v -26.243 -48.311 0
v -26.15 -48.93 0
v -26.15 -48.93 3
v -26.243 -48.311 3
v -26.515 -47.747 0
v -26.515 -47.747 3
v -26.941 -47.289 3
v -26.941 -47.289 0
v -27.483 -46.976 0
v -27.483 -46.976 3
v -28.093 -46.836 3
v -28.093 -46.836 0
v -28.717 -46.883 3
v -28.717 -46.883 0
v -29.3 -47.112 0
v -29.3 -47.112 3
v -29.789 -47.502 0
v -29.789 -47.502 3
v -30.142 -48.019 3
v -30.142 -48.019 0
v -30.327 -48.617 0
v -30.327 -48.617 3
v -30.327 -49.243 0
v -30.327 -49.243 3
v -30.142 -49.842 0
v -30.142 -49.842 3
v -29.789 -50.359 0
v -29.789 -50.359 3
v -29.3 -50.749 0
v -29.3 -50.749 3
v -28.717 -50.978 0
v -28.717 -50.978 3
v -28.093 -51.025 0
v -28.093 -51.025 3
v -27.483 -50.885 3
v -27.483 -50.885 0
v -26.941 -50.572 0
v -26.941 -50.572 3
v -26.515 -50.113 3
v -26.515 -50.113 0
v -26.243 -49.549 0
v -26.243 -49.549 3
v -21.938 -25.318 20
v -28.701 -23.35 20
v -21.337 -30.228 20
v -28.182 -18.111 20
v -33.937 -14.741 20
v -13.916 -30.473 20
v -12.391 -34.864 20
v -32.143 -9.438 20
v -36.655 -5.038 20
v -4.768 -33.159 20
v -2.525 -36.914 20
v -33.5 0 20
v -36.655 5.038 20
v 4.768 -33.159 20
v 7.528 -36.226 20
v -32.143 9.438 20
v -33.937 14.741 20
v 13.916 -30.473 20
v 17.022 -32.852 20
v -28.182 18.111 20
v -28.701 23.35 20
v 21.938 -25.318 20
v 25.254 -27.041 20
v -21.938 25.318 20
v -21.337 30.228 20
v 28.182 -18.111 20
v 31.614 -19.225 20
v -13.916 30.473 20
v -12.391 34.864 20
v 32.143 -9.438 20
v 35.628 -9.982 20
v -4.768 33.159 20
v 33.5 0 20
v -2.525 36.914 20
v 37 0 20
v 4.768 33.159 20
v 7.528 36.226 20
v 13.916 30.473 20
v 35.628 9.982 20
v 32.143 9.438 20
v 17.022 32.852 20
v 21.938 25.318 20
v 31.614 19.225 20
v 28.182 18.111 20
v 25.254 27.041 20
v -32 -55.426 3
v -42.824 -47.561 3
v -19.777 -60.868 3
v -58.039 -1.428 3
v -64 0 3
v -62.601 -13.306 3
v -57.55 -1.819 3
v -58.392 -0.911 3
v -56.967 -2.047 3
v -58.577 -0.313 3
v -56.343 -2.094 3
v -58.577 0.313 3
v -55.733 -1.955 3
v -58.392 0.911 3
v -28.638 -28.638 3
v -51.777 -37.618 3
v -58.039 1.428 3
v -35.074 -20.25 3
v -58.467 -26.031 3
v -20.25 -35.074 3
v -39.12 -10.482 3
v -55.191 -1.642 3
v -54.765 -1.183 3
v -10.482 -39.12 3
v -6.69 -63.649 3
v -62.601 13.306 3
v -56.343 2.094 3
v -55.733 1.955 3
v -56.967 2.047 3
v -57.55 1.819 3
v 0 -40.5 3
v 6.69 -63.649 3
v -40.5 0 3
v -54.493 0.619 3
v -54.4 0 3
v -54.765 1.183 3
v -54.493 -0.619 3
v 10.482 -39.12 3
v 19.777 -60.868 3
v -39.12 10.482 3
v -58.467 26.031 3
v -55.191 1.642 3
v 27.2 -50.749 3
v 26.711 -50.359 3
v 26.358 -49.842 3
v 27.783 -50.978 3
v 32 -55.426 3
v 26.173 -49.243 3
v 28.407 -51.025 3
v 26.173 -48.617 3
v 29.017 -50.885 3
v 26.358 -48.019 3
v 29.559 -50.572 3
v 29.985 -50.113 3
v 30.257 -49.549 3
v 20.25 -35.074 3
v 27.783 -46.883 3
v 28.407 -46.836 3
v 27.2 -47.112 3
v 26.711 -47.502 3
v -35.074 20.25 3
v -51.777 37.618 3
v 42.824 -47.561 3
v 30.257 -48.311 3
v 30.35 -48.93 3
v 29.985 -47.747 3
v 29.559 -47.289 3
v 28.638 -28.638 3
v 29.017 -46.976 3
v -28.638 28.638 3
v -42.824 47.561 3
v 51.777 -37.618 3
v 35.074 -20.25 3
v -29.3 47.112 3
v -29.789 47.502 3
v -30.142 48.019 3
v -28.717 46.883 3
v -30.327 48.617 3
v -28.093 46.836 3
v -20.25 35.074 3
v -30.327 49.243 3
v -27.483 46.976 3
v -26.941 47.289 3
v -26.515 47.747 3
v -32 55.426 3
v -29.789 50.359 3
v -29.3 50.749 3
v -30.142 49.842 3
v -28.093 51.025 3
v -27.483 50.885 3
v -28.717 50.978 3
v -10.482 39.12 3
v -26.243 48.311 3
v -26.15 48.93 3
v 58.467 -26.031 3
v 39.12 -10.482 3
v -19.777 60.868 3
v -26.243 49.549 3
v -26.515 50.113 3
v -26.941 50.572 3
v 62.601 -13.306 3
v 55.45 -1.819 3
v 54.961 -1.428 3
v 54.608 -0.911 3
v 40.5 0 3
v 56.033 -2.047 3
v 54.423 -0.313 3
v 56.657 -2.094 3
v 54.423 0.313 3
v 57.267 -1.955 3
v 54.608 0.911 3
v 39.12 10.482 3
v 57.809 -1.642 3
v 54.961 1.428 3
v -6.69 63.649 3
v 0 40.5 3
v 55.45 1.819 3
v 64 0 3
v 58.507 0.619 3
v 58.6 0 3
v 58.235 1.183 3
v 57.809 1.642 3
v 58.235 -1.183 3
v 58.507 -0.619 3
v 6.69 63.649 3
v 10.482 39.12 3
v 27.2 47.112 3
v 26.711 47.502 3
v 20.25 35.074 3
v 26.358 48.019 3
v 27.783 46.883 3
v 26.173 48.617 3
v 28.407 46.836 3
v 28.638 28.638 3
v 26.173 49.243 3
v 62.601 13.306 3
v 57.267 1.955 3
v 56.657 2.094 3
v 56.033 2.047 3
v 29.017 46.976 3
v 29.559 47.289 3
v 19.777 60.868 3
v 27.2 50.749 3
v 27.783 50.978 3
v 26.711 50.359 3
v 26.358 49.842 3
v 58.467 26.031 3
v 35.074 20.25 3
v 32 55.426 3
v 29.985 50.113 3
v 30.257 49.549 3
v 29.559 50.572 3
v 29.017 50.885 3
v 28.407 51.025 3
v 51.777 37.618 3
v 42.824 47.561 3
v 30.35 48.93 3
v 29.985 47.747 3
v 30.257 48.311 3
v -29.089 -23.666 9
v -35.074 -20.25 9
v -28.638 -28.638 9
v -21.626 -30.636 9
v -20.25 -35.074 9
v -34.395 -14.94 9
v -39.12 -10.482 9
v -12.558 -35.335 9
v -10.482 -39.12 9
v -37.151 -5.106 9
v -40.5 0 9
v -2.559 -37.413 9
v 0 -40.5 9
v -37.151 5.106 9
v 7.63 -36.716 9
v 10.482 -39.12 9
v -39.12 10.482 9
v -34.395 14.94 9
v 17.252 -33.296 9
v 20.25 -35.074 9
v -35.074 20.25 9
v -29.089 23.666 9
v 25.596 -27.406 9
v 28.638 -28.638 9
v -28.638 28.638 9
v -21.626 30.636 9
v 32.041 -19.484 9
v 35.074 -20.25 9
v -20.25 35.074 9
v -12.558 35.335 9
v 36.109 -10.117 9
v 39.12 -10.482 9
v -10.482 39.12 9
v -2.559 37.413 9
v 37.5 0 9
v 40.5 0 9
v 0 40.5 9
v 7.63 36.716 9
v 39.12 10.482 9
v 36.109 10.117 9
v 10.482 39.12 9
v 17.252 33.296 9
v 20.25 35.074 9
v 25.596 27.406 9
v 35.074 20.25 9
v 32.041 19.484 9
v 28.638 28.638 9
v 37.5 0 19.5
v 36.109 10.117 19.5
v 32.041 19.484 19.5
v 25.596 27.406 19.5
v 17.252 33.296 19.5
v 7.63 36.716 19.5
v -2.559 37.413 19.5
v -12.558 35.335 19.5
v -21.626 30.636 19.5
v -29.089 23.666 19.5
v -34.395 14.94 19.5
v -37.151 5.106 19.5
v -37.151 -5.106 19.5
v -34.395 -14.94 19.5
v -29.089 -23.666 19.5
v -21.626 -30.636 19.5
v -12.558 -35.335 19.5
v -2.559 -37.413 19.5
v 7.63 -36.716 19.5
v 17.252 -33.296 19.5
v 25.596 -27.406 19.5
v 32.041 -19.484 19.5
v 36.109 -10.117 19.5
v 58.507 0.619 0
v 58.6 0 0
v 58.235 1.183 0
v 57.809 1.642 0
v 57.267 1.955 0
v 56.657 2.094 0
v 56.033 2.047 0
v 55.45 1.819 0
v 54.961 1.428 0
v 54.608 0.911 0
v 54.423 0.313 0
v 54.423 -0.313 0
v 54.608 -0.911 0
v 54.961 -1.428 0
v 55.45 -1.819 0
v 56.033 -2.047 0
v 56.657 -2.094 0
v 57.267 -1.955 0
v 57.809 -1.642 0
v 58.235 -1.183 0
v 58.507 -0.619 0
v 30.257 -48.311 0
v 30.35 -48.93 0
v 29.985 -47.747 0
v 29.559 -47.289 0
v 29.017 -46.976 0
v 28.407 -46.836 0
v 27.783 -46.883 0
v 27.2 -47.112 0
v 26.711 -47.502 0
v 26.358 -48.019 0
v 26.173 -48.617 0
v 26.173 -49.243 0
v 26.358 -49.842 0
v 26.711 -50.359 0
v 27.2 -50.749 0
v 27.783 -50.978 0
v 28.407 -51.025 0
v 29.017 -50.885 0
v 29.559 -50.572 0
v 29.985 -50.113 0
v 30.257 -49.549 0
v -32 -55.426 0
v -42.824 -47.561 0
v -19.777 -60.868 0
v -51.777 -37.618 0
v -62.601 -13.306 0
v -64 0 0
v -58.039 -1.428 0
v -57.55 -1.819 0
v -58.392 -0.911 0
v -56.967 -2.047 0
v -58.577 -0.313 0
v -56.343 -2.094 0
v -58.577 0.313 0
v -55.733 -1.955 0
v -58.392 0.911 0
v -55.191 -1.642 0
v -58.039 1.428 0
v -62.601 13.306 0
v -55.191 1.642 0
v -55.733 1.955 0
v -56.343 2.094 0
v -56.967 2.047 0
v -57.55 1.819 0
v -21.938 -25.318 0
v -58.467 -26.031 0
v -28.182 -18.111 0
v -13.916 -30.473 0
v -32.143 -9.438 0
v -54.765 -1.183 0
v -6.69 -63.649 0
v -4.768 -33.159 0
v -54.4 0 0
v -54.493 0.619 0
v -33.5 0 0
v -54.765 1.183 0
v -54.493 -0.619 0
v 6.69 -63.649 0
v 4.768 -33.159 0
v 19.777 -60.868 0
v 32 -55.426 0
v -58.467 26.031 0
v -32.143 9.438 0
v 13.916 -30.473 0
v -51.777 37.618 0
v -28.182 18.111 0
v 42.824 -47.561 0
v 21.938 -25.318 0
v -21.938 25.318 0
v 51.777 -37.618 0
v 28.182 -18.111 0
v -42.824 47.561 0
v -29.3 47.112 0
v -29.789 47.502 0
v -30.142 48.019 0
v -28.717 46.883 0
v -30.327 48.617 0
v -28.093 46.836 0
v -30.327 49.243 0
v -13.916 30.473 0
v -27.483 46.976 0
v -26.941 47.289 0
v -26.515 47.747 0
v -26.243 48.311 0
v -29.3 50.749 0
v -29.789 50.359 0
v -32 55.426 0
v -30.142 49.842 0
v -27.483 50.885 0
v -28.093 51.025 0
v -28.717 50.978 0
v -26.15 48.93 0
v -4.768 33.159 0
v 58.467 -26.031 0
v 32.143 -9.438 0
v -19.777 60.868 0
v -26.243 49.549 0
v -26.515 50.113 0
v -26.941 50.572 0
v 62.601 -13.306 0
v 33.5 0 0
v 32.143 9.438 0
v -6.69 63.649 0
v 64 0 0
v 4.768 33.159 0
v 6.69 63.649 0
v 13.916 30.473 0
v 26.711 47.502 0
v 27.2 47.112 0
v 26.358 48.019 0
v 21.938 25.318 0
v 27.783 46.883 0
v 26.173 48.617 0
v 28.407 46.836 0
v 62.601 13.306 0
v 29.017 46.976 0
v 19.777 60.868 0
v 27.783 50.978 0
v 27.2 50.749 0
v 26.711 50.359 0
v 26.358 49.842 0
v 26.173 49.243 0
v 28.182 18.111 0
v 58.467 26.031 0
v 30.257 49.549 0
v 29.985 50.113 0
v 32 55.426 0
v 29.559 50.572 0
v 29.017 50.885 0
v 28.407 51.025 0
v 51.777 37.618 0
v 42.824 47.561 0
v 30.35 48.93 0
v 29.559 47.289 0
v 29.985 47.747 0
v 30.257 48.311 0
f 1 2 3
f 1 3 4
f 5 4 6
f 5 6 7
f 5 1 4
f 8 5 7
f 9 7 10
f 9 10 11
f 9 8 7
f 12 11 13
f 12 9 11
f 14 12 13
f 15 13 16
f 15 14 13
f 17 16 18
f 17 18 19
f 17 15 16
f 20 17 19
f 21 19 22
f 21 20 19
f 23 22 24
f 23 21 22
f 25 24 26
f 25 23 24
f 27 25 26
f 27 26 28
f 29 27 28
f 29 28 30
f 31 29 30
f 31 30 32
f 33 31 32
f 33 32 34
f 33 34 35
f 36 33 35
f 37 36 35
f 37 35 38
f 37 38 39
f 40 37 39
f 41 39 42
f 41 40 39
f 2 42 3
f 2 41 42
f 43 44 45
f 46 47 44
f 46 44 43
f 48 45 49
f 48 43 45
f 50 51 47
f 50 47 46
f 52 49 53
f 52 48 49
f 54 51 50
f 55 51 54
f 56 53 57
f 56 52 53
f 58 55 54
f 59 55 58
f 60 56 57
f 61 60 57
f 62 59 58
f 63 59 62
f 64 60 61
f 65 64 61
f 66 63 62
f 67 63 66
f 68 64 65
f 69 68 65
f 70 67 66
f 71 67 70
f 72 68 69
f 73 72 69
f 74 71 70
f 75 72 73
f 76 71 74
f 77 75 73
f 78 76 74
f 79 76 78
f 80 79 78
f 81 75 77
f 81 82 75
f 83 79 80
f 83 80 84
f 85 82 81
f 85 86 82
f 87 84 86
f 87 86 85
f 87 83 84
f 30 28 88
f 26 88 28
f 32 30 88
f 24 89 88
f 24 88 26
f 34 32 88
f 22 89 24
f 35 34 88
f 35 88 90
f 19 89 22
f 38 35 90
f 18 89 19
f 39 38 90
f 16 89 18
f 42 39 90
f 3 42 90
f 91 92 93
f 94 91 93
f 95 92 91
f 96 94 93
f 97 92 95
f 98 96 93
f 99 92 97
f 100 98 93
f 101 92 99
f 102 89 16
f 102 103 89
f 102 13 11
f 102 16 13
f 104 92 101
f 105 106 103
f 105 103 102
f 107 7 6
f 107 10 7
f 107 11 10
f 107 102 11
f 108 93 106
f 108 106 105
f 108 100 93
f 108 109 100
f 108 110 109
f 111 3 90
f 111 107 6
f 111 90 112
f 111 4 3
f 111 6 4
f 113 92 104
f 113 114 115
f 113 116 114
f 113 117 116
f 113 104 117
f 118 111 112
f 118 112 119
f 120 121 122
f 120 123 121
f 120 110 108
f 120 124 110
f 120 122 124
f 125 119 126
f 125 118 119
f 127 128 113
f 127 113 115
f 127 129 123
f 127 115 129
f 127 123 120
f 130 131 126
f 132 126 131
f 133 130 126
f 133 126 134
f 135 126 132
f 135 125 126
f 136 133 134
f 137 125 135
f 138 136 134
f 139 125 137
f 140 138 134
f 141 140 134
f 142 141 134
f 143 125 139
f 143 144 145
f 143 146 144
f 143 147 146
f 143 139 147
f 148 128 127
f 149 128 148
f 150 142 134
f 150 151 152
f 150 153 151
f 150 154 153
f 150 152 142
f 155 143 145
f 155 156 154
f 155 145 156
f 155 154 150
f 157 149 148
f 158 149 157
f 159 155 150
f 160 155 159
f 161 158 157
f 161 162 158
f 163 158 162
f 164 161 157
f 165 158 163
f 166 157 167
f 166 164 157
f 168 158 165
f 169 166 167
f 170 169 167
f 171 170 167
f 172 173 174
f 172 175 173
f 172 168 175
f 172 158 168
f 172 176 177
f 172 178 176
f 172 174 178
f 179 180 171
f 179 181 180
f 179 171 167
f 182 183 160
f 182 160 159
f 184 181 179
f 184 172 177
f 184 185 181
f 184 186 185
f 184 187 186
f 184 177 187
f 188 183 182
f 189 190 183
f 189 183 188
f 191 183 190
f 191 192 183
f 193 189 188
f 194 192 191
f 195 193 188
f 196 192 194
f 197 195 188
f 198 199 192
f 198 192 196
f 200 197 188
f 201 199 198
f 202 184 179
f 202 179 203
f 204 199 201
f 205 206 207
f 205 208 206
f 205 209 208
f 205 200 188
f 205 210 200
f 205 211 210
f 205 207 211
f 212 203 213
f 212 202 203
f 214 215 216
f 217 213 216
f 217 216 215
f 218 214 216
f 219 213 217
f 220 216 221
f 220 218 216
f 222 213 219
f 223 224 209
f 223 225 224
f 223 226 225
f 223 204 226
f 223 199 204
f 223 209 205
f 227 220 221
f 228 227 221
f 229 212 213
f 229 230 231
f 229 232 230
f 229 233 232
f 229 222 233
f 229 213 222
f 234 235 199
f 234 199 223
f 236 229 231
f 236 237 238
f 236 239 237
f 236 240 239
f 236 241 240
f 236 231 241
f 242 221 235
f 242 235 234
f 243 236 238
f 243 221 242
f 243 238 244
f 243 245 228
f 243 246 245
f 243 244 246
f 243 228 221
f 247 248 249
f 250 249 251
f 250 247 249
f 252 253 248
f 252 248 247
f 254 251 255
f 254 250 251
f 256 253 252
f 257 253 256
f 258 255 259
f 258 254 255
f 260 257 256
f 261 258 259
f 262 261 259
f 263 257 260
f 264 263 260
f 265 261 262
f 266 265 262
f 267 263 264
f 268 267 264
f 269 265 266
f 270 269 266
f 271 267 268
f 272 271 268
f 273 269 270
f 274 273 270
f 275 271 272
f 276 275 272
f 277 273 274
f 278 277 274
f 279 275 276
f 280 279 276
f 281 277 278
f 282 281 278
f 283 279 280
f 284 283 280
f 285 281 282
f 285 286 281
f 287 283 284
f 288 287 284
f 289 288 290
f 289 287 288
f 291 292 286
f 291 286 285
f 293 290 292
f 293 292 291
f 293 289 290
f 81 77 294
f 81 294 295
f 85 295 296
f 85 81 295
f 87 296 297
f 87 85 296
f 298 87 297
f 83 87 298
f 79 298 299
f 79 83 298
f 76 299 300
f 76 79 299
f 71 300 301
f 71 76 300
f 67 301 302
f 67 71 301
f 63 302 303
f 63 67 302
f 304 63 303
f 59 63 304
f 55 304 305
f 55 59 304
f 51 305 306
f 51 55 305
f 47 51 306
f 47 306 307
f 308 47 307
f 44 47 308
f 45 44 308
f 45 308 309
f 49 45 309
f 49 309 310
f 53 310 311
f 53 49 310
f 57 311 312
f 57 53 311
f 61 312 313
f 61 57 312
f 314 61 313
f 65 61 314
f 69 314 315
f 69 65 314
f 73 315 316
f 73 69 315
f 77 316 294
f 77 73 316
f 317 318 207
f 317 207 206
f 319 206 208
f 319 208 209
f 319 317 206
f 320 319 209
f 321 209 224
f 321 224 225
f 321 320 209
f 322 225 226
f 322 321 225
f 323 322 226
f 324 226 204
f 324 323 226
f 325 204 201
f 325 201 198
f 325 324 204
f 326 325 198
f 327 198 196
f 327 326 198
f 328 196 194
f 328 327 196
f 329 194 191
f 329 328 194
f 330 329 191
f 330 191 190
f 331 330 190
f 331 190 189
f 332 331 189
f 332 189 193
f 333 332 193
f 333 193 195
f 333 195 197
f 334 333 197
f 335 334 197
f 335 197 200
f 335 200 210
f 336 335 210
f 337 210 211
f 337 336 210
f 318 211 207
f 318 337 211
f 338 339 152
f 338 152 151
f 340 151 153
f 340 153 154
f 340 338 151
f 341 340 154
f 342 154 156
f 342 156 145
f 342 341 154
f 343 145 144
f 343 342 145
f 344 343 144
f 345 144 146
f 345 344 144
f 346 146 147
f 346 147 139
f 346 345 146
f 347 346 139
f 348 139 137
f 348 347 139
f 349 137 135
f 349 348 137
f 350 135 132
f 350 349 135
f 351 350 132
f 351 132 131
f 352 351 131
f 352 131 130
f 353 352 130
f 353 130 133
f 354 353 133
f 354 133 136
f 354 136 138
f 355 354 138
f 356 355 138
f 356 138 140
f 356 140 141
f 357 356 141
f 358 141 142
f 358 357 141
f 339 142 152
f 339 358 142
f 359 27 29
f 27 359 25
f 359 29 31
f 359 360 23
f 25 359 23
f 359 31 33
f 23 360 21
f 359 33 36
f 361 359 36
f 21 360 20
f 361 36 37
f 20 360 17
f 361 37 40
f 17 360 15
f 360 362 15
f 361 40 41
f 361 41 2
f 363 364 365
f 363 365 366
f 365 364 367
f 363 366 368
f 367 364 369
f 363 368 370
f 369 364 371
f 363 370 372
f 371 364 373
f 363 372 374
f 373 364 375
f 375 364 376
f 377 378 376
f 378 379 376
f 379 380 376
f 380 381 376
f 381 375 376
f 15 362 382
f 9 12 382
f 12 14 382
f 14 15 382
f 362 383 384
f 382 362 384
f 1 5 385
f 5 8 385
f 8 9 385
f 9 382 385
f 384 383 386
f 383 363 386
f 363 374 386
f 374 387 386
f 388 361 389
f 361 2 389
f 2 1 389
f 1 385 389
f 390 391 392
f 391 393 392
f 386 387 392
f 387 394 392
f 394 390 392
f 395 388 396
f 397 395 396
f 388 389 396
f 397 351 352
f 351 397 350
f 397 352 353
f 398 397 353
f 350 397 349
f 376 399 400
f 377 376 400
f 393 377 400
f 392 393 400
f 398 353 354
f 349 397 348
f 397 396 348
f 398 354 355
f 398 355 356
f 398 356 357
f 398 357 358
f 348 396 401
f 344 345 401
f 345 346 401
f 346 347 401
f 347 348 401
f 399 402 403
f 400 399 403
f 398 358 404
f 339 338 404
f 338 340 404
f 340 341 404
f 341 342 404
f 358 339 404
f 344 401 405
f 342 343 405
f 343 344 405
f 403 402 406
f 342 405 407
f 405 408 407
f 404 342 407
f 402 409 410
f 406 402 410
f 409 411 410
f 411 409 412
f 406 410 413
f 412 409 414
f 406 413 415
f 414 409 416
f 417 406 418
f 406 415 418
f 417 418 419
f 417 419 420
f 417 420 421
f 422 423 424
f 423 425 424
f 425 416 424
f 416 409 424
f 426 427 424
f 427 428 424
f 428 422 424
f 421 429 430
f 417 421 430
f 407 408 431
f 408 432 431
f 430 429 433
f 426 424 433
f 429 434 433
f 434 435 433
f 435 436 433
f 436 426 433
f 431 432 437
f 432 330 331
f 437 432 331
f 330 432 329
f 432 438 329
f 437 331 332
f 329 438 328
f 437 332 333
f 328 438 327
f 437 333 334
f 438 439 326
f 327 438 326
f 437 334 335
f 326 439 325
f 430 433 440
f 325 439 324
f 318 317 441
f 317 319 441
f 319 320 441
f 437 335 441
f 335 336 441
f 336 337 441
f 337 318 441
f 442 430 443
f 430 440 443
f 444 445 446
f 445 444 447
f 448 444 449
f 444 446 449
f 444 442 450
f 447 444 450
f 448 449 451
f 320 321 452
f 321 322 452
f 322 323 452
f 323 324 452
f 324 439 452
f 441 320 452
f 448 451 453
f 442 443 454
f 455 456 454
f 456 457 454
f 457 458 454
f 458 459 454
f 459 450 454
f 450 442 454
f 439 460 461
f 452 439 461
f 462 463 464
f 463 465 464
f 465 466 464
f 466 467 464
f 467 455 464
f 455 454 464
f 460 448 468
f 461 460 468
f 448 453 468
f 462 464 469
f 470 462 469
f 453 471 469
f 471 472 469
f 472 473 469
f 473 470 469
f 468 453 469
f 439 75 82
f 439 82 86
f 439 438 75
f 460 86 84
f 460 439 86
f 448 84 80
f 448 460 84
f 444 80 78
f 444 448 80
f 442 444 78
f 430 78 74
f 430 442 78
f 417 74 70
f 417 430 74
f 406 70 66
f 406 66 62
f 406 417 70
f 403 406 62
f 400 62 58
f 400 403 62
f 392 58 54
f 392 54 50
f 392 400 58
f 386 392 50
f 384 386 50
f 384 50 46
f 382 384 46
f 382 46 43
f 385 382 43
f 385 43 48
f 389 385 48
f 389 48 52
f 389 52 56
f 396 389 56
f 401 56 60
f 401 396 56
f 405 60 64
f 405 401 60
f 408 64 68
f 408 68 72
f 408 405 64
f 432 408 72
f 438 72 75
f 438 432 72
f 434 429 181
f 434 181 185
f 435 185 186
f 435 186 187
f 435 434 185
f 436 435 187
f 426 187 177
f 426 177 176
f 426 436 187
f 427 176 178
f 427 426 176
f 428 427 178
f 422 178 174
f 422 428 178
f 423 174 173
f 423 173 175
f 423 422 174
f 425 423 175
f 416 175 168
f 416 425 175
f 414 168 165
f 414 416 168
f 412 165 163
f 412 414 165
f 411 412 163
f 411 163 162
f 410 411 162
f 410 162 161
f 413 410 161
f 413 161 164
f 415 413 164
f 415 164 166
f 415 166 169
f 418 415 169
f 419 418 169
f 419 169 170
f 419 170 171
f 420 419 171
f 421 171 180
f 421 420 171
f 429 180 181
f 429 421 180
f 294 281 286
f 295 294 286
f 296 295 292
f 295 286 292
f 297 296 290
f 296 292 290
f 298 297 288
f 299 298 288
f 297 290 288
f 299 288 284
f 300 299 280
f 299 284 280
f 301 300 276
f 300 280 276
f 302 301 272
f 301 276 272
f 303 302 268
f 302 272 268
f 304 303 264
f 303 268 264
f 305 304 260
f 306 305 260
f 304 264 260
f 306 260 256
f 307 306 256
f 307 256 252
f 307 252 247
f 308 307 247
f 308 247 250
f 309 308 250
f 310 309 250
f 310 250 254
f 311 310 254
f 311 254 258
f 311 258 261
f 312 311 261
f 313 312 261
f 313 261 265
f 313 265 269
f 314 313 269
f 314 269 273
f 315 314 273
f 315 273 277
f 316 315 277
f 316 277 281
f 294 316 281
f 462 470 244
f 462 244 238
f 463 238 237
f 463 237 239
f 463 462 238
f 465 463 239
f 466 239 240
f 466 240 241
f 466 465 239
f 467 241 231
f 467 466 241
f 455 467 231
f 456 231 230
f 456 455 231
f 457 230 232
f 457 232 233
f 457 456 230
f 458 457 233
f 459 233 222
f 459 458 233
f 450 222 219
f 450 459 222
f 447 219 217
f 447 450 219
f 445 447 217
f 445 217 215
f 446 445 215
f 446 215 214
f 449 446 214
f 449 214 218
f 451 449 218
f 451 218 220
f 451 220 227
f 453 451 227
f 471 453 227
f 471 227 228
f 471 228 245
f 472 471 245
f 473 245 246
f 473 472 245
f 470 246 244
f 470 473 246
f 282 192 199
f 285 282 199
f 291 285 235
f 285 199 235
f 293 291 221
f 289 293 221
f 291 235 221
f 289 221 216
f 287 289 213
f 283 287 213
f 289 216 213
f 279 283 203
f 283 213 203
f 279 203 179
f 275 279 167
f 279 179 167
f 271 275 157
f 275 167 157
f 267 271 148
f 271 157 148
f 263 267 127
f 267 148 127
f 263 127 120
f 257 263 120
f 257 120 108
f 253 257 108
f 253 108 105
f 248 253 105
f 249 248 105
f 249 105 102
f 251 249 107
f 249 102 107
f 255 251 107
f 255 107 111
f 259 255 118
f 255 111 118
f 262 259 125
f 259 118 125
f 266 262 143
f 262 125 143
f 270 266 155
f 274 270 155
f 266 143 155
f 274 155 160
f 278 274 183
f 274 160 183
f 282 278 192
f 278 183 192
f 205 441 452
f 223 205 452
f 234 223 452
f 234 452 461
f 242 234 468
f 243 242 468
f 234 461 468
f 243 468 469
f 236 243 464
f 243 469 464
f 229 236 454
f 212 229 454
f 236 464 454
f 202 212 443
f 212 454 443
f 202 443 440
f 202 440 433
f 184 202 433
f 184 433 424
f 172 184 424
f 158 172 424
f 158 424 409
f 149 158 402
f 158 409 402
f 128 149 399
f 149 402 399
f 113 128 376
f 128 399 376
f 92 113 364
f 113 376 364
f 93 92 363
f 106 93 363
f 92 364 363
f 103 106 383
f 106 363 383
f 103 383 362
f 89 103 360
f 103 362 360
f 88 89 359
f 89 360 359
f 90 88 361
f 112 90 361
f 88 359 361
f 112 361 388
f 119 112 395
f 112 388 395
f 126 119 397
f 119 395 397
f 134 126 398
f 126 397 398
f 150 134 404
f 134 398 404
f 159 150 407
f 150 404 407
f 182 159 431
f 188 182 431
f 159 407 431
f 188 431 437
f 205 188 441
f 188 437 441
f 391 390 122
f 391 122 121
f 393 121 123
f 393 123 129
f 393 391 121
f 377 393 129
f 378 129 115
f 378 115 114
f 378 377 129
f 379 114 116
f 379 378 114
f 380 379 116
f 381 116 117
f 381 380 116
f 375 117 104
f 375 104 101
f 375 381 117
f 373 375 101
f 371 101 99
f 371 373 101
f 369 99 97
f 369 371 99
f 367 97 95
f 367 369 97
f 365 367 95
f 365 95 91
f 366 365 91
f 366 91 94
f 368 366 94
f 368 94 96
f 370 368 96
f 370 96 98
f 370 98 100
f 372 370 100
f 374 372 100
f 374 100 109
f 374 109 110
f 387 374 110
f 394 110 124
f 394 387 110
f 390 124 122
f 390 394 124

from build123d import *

# Parameters (mm, degrees)
SKETCH_R      = 64
SKETCH_R_2    = 2.1
SKETCH_R_3    = 33.5
PAD_DEPTH     = 3
SKETCH001_R   = 37.5
SKETCH001_R_2 = 33.5
PAD001_DEPTH  = 17
SKETCH002_R   = 40.5
SKETCH002_R_2 = 37.5
PAD002_DEPTH  = 6
CHAMFER_SIZE  = 0.5


with BuildPart() as part:
    # Sketch → Pad (new body)
    with BuildSketch(Plane.XY):
        Circle(SKETCH_R)
        with Locations((-28.25, 48.930435)):
            Circle(SKETCH_R_2, mode=Mode.SUBTRACT)
        with Locations((28.25, 48.930435)):
            Circle(SKETCH_R_2, mode=Mode.SUBTRACT)
        with Locations((56.5, 0)):
            Circle(SKETCH_R_2, mode=Mode.SUBTRACT)
        with Locations((28.25, -48.930435)):
            Circle(SKETCH_R_2, mode=Mode.SUBTRACT)
        with Locations((-28.25, -48.930435)):
            Circle(SKETCH_R_2, mode=Mode.SUBTRACT)
        with Locations((-56.5, 0)):
            Circle(SKETCH_R_2, mode=Mode.SUBTRACT)
        Circle(SKETCH_R_3, mode=Mode.SUBTRACT)
    extrude(amount=PAD_DEPTH)

    # Sketch001 (on Face10 of Pad) → Pad001 (join)
    with BuildSketch(Plane.XY.offset(3)):
        Circle(SKETCH001_R)
        Circle(SKETCH001_R_2, mode=Mode.SUBTRACT)
    extrude(amount=PAD001_DEPTH)

    # Sketch002 (on Face3 of Pad001) → Pad002 (join)
    with BuildSketch(Plane.XY.offset(3)):
        Circle(SKETCH002_R)
        Circle(SKETCH002_R_2, mode=Mode.SUBTRACT)
    extrude(amount=PAD002_DEPTH)

    # Chamfer
    chamfer_edges = [part.edges().sort_by_distance(p)[0] for p in [
        (-37.5, 0, 20),
    ]]
    chamfer(chamfer_edges, length=CHAMFER_SIZE)


solid = part.part
